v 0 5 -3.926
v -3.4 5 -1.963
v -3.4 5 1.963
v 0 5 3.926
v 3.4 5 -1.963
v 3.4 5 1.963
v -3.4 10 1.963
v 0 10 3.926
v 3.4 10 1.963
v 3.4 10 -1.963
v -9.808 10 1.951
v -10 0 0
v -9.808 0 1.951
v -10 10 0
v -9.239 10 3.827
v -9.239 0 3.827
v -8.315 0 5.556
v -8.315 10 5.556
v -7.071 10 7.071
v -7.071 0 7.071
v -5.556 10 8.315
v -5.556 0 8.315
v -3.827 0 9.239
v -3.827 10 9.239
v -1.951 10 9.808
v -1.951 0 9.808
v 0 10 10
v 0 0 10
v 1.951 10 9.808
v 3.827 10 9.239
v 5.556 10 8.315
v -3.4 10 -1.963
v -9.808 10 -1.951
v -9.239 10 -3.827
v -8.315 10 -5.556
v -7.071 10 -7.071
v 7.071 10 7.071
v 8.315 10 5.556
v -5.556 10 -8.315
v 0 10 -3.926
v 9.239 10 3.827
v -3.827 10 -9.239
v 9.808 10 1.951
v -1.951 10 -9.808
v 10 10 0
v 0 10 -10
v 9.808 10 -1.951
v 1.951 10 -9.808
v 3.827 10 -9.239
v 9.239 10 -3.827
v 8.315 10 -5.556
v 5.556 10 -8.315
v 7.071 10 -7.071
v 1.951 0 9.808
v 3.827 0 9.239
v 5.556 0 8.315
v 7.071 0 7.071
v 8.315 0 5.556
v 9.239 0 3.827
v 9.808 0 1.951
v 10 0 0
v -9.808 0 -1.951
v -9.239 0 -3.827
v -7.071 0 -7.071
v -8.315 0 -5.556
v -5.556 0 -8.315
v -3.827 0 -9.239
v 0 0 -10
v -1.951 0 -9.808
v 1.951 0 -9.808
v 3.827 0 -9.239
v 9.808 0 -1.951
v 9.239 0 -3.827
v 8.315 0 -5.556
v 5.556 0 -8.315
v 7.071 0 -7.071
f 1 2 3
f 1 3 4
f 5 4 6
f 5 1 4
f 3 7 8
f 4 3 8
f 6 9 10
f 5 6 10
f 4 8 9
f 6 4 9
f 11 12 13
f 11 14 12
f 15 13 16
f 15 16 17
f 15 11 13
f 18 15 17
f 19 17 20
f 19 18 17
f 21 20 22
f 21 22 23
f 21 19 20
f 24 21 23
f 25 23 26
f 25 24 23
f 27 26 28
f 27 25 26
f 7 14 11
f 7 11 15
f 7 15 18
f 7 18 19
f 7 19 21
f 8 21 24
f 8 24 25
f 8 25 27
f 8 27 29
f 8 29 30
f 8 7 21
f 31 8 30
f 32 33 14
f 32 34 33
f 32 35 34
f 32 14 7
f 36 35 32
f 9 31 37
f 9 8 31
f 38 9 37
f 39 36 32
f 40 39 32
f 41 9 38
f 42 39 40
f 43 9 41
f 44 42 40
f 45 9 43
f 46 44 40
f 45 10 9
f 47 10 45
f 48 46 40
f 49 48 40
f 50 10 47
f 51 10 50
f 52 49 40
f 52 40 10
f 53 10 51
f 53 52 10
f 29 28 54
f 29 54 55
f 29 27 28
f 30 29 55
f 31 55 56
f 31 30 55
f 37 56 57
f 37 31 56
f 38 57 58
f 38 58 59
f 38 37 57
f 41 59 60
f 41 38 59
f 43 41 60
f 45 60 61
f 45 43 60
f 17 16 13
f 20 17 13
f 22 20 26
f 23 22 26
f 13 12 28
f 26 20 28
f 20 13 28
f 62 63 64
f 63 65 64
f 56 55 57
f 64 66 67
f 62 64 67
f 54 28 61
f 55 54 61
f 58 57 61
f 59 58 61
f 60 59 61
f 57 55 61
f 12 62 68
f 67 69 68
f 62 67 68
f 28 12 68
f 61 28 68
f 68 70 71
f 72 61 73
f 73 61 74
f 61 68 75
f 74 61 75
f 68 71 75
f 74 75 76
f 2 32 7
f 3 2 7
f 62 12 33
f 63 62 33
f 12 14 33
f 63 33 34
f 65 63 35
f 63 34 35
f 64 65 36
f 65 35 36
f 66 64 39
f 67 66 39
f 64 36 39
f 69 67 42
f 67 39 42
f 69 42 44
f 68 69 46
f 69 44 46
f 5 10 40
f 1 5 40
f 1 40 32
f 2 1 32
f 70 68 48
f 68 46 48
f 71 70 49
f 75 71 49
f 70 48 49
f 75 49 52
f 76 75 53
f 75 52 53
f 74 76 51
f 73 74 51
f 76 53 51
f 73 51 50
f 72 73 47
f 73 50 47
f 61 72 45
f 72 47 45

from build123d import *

# Parameters (mm, degrees)
SKETCH1_W           = 20
SKETCH1_H           = 20
BOSS_EXTRUDE1_DEPTH = 10
CUT_EXTRUDE1_DEPTH  = 5
FILLET1_R           = 10


with BuildPart() as part:
    # Sketch1 → Boss-Extrude1 (new body)
    with BuildSketch(Plane(origin=(0, 0, 0), x_dir=(1, 0, 0), z_dir=(0, 1, 0))):
        Rectangle(SKETCH1_W, SKETCH1_H)
    extrude(amount=BOSS_EXTRUDE1_DEPTH)

    # Sketch2 → Cut-Extrude1 (cut)
    with BuildSketch(Plane(origin=(0, 10, 0), x_dir=(1, 0, 0), z_dir=(0, 1, 0))):
        Polygon((0, 3.92598183), (-3.4, 1.962990915), (-3.4, -1.962990915), (0, -3.92598183), (3.4, -1.962990915), (3.4, 1.962990915), align=None)
    extrude(amount=-CUT_EXTRUDE1_DEPTH, mode=Mode.SUBTRACT)

    # Fillet1
    fillet1_edges = [part.edges().sort_by_distance(p)[0] for p in [
        (10, 5, -10),
        (10, 5, 10),
        (-10, 5, -10),
        (-10, 5, 10),
    ]]
    fillet(fillet1_edges, radius=FILLET1_R - 0.0001)  # a hair under: the kernel refuses the full size


solid = part.part
